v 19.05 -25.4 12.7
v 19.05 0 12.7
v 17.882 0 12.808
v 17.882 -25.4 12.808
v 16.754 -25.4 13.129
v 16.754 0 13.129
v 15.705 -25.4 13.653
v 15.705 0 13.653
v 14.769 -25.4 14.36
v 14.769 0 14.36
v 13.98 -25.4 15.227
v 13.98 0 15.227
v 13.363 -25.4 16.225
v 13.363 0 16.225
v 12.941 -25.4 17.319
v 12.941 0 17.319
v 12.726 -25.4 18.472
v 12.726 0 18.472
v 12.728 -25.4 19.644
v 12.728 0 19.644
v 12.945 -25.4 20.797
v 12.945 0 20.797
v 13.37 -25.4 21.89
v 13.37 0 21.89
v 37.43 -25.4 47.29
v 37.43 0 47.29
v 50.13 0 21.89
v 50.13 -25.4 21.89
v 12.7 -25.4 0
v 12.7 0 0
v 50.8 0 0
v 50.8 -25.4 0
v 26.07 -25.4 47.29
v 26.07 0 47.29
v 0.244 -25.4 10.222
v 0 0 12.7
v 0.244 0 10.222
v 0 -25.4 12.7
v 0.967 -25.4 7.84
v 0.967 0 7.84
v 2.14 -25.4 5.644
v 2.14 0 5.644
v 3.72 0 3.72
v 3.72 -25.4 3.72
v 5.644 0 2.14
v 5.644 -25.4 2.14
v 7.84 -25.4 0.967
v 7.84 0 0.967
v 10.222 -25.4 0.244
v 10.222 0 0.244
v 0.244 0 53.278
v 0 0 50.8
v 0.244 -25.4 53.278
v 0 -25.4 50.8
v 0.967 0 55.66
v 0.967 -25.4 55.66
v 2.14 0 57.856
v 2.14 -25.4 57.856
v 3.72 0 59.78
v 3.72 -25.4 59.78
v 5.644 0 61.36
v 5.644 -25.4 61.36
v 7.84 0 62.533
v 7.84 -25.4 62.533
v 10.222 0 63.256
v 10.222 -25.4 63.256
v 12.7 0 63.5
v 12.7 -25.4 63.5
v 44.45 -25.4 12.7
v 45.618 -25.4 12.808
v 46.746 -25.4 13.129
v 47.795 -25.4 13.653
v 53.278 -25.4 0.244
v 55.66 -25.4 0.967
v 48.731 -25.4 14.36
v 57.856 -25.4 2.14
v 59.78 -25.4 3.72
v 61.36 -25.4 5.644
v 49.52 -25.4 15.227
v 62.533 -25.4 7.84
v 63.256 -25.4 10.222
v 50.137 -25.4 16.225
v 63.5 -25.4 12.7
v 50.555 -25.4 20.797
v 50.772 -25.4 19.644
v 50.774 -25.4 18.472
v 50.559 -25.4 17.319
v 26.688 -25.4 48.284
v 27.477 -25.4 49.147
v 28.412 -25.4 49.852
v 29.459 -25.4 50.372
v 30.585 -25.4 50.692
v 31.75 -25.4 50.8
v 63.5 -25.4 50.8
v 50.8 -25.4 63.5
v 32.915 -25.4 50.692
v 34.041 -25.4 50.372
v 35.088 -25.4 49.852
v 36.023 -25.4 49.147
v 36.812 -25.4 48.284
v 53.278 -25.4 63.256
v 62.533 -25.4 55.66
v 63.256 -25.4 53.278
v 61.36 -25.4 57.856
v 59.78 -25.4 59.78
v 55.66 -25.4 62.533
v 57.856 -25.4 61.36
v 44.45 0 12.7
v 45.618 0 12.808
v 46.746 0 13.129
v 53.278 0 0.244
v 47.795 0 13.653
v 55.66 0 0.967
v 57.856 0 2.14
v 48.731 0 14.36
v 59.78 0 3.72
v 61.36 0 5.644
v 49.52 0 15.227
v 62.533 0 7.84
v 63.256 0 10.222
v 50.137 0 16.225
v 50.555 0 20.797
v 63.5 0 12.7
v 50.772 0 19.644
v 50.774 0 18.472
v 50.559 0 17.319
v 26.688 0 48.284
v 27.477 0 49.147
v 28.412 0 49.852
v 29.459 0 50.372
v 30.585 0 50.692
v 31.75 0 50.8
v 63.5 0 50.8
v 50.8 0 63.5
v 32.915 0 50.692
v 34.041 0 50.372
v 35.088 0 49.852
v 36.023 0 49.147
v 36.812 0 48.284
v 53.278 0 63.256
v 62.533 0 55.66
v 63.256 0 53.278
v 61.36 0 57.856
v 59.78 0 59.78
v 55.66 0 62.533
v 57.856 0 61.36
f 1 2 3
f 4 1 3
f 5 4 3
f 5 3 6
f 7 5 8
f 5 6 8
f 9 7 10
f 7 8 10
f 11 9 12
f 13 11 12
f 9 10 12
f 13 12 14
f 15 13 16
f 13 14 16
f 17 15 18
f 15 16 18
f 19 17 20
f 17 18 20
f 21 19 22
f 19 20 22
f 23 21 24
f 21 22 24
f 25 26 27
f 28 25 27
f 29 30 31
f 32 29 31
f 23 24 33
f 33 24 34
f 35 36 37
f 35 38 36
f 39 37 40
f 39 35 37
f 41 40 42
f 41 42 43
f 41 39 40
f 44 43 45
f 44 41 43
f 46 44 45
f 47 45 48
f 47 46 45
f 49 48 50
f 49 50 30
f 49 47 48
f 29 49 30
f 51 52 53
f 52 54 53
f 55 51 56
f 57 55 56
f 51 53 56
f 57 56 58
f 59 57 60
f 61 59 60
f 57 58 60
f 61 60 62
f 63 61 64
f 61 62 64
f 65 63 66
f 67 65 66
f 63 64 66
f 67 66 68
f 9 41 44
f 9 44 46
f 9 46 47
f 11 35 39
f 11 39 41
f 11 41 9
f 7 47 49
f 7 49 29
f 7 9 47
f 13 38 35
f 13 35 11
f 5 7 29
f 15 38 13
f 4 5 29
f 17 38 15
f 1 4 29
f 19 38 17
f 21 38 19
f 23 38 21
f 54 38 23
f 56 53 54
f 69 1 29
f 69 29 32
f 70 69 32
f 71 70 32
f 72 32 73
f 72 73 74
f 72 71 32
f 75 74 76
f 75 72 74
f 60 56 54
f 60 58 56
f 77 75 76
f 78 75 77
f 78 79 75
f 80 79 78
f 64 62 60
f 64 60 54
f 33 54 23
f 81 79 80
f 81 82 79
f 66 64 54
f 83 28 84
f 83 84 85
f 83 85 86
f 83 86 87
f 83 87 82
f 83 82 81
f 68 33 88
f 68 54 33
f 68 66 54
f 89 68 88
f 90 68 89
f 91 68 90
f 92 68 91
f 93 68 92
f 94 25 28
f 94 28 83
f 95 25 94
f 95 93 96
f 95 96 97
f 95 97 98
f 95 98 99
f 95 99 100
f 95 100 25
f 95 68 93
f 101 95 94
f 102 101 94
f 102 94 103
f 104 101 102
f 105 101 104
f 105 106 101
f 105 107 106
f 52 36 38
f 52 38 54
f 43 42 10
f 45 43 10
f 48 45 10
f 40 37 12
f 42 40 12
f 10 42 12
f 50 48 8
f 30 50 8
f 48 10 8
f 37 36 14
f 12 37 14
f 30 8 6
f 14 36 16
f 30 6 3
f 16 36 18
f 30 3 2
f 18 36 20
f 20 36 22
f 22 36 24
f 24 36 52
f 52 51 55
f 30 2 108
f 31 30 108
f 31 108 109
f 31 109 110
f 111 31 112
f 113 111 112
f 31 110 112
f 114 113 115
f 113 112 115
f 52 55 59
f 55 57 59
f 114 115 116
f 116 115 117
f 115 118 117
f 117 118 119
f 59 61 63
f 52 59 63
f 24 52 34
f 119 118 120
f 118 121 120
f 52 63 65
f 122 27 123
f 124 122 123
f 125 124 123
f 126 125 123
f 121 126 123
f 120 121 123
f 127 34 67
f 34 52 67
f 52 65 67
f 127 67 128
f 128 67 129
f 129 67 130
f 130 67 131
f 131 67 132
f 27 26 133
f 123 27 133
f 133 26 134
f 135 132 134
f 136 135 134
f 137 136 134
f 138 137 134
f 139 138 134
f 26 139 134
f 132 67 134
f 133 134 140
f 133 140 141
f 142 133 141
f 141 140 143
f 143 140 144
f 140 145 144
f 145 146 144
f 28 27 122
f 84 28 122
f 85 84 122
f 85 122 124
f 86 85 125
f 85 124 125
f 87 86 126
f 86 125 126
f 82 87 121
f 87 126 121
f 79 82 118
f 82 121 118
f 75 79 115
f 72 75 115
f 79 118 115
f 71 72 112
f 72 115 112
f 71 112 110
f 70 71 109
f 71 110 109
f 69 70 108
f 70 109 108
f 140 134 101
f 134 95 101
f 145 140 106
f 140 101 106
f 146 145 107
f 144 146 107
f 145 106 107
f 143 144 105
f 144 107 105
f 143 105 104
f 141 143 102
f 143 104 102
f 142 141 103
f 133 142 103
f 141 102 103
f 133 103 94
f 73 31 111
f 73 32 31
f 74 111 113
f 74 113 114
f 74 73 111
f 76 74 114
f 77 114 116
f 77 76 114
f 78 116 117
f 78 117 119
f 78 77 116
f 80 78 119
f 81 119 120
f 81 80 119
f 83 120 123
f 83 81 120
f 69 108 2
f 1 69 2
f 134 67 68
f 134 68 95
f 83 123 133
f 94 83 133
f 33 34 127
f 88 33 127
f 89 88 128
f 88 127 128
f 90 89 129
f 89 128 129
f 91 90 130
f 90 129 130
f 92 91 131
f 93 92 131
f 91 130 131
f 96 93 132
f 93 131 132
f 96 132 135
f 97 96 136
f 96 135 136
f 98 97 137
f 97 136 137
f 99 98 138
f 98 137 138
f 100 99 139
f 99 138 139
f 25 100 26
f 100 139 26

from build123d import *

# Parameters (mm, degrees)
F0_W     = 63.5
F0_H     = 63.5
F1_DEPTH = 25.4
F2_R     = 12.7


with BuildPart() as f1:
    # F0 (on Front) → F1 (new body)
    with BuildSketch(Plane.XZ):
        with Locations((31.75, 31.75)):
            Rectangle(F0_W, F0_H)
        with BuildLine():
            ThreePointArc((19.05, 12.7), (13.648367, 15.711607), (13.370387, 21.889806))
            Line((13.370387, 21.889806), (26.070387, 47.289806))
            ThreePointArc((26.070387, 47.289806), (31.75, 50.8), (37.429613, 47.289806))
            Line((37.429613, 47.289806), (50.129613, 21.889806))
            ThreePointArc((50.129613, 21.889806), (49.851633, 15.711607), (44.45, 12.7))
            Line((44.45, 12.7), (19.05, 12.7))
        make_face(mode=Mode.SUBTRACT)
    extrude(amount=F1_DEPTH)

    # F2
    f2_edges = [f1.edges().sort_by_distance(p)[0] for p in [
        (63.5, -12.7, 63.5),
        (0, -12.7, 63.5),
        (0, -12.7, 0),
        (63.5, -12.7, 0),
    ]]
    fillet(f2_edges, radius=F2_R)


solid = f1.part
